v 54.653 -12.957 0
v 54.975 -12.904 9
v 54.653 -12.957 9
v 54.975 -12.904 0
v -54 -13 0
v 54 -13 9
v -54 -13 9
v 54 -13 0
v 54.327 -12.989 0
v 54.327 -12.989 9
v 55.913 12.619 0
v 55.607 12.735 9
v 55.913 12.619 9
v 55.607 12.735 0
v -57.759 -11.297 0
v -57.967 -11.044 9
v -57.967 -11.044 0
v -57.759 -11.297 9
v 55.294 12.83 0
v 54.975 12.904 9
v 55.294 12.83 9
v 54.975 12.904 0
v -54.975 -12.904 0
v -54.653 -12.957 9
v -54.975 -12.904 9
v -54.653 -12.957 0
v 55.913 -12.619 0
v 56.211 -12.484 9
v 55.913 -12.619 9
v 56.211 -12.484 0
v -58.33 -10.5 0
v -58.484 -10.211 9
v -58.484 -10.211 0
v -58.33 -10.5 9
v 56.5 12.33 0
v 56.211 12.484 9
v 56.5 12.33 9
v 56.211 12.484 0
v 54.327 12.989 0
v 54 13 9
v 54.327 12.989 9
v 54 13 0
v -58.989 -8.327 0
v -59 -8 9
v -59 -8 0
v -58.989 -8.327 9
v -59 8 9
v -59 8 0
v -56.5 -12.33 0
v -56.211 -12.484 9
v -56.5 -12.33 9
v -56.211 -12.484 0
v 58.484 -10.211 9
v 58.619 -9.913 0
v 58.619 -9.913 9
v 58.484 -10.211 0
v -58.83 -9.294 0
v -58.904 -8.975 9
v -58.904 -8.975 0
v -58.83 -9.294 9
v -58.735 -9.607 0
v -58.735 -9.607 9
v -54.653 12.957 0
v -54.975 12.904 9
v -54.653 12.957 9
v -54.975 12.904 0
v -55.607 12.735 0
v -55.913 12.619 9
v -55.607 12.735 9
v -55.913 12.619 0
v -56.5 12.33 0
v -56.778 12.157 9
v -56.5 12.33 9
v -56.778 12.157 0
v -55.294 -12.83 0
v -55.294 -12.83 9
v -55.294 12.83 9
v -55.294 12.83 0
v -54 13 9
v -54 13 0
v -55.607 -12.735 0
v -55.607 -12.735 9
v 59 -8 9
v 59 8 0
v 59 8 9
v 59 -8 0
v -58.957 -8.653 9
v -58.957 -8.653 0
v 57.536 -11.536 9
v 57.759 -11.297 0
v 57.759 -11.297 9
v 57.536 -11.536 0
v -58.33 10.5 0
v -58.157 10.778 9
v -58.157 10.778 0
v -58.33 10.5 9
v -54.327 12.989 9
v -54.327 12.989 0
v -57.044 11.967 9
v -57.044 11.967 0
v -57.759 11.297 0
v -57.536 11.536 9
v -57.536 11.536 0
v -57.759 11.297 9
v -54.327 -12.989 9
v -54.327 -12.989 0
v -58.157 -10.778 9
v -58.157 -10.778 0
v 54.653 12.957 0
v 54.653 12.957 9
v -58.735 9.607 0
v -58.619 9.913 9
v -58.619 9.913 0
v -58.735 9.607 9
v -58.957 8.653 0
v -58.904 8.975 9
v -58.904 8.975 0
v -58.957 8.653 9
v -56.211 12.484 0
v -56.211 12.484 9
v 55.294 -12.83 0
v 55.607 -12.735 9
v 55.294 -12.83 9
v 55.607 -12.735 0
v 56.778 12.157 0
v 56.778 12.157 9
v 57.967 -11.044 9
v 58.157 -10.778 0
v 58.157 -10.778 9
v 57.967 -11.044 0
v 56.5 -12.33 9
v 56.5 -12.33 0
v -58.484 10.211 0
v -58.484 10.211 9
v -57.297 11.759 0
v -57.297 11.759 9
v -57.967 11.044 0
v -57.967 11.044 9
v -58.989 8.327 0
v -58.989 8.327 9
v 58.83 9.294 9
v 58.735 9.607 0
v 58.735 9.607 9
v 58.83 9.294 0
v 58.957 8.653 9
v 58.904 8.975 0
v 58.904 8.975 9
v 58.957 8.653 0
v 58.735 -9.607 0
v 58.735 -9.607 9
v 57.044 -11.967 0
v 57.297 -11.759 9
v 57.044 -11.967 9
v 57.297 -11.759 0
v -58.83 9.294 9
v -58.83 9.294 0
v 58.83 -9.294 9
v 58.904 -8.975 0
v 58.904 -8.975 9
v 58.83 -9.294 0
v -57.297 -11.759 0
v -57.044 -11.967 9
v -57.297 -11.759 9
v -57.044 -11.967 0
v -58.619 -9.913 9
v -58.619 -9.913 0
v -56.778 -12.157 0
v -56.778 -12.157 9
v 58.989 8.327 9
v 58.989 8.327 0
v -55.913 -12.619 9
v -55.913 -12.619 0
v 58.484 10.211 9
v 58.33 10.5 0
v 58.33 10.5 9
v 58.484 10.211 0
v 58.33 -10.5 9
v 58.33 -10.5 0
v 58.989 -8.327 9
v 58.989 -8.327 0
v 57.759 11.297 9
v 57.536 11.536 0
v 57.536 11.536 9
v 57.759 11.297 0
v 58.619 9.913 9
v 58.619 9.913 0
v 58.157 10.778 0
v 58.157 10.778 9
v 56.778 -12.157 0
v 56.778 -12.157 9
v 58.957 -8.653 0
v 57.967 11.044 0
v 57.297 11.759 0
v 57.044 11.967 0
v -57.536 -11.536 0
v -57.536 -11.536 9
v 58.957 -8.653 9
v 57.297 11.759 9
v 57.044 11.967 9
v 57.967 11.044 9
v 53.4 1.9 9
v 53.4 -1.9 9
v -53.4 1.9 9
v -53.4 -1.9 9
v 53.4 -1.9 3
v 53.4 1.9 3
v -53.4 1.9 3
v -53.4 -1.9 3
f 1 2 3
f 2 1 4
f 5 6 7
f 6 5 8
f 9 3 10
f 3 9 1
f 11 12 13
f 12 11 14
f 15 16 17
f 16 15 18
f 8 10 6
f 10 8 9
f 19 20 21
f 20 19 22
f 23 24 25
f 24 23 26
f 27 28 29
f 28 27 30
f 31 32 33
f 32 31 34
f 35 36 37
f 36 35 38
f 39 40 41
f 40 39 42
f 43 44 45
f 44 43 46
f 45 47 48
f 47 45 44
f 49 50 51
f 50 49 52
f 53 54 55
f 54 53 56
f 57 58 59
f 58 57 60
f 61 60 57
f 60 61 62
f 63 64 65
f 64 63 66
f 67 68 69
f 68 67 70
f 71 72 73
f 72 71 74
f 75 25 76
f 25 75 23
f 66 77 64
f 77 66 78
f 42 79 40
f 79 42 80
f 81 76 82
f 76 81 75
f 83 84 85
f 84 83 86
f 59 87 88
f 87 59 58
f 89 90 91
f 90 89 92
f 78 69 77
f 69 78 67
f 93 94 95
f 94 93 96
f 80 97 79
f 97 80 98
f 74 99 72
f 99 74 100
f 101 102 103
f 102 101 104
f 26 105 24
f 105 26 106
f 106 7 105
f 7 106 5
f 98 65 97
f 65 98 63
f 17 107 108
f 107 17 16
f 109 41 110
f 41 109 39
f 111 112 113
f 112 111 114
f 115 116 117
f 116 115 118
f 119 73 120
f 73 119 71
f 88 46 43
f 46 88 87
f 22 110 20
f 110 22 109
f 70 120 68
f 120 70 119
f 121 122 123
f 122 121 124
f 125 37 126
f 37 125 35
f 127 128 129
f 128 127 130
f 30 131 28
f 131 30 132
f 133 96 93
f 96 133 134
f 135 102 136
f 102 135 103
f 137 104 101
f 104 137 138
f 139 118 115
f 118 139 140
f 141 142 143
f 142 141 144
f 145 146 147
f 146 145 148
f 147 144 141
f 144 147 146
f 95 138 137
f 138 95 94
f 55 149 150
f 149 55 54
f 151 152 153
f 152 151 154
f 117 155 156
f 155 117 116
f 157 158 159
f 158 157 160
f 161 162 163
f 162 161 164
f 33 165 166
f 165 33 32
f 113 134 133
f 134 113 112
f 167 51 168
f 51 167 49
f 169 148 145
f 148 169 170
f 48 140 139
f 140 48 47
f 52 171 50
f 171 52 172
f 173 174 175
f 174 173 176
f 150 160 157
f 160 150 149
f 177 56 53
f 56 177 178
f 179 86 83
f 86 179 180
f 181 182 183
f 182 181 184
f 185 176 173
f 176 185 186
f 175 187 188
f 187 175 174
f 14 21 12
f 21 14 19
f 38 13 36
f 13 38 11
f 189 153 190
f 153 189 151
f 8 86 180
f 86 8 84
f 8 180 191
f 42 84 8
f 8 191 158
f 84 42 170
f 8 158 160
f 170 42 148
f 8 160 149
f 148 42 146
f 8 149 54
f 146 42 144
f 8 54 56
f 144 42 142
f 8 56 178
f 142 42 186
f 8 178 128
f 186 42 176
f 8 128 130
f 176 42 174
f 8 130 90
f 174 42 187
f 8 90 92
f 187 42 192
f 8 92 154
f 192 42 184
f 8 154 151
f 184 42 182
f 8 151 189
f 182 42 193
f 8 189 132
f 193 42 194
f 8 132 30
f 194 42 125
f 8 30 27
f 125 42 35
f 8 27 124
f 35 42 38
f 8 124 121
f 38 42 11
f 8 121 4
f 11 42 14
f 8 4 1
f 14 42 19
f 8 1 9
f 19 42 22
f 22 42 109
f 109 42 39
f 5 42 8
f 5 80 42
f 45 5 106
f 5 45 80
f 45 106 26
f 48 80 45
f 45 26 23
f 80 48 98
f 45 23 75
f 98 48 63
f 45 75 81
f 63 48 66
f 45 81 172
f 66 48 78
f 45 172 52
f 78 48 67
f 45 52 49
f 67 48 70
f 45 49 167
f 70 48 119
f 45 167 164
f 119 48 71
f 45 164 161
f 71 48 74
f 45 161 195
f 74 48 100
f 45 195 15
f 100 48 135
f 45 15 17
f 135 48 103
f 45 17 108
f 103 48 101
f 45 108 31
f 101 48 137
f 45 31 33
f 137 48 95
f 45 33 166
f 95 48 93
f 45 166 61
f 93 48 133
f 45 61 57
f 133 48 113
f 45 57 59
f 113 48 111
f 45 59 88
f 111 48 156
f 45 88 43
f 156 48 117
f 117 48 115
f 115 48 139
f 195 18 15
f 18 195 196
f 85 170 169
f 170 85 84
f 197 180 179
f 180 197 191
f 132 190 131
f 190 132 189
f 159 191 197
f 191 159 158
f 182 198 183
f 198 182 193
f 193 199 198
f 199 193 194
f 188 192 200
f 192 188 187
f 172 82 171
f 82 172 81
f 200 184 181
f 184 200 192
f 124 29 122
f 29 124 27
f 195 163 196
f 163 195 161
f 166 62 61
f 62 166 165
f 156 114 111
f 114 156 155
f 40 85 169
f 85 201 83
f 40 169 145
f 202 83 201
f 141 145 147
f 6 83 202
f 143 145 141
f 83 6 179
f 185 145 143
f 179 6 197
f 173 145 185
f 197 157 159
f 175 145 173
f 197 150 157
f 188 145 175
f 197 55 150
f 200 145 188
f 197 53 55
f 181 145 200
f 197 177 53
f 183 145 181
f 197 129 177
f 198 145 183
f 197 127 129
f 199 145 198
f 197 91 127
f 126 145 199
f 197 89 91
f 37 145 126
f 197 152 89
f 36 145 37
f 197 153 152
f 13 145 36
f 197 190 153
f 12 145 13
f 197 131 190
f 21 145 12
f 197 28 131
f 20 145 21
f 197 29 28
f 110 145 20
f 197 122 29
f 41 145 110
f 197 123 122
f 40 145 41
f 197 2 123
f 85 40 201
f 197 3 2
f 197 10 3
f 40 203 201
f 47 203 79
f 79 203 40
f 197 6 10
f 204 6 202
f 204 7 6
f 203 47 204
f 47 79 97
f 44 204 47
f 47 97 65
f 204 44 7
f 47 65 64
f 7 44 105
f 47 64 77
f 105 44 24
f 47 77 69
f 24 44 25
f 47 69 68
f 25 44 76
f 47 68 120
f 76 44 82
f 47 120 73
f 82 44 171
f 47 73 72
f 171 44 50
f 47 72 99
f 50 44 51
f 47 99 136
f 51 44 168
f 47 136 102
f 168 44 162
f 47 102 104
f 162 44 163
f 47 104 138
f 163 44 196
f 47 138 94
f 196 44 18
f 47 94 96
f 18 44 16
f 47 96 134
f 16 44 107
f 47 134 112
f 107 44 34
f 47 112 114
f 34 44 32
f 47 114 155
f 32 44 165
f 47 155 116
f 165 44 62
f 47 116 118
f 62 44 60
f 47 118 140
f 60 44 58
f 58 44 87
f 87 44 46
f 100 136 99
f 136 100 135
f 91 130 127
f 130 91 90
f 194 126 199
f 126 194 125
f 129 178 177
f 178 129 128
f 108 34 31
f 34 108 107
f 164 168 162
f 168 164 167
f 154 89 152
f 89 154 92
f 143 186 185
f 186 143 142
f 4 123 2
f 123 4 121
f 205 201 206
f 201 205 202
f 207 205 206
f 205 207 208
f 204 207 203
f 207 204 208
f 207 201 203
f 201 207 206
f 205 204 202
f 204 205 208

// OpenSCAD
// Base da litofania — modelo próprio do Multiferramenta 3D
// tipo: "pe" (encaixe simples) ou "luminaria" (encaixe + espaço pra velinha de LED atrás da foto)
formato = "plana";      // plana | curva | cilindro
tipo = "pe";
largura = 106;          // largura TOTAL da placa (com moldura)
esp = 3;                // espessura máxima da placa
raio = 48;              // raio da curva (litofania curva)
encaixe = 6;            // profundidade da ranhura
folga = 0.4;            // folga de cada lado da ranhura
vela = 40;              // diâmetro do espaço da velinha de LED
parte = "base";
$fn = 96;

alt = encaixe + 3;
fenda = esp + 2 * folga;

module plana() {
  prof = tipo == "luminaria" ? 70 : 26;
  y_fenda = tipo == "luminaria" ? -prof / 2 + 12 : 0;       // na luminária a placa fica na frente, a luz atrás
  difference() {
    translate([0, 0, 0]) linear_extrude(alt) offset(r = 5) square([largura + 12 - 10, prof - 10], center = true);
    translate([-(largura + 2 * folga) / 2, y_fenda - fenda / 2, 3]) cube([largura + 2 * folga, fenda, encaixe + 1]);
    if (tipo == "luminaria") translate([0, y_fenda + fenda / 2 + 4 + vela / 2, alt - 4]) cylinder(d = vela + 1, h = 5);
  }
}

module curva() {
  ang = largura / raio * 180 / PI;                           // arco total da placa
  c = [0, raio];                                             // centro da curva (onde fica a luz)
  difference() {
    linear_extrude(alt) hull() {
      translate(c) rotate(-90 - ang / 2 - 4) circle_sector(raio + esp + 8, ang + 8);
      translate(c) circle(d = (tipo == "luminaria" ? vela + 16 : 20));
    }
    // ranhura em arco: mesmo raio da placa
    translate([c[0], c[1], 3]) rotate([0, 0, -90 - ang / 2 - 1]) rotate_extrude(angle = ang + 2)
      translate([raio - folga, 0]) square([fenda, encaixe + 1]);
    if (tipo == "luminaria") translate([c[0], c[1], alt - 4]) cylinder(d = vela + 1, h = 5);
  }
}
// cilindro 360°: ranhura redonda inteira, velinha no centro e saída pro fio (luminária)
module cilindro() difference() {
  linear_extrude(alt) circle(r = raio + esp + 7);
  translate([0, 0, 3]) rotate_extrude() translate([raio - folga, 0]) square([fenda, encaixe + 1]);
  if (tipo == "luminaria") {
    translate([0, 0, alt - 4]) cylinder(d = min(vela + 1, 2 * raio - 4), h = 5);
    translate([0, 0, alt - 4]) rotate([0, 0, -90]) translate([0, -3, 0]) cube([raio + esp + 10, 6, 5]);   // canal pro fio, se for LED com cabo
  }
}
module circle_sector(r, a) polygon(concat([[0, 0]], [for (t = [0 : a / 48 : a]) [r * cos(t), r * sin(t)]]));

if (parte == "base") { if (formato == "cilindro") cilindro(); else if (formato == "curva") curva(); else plana(); }
